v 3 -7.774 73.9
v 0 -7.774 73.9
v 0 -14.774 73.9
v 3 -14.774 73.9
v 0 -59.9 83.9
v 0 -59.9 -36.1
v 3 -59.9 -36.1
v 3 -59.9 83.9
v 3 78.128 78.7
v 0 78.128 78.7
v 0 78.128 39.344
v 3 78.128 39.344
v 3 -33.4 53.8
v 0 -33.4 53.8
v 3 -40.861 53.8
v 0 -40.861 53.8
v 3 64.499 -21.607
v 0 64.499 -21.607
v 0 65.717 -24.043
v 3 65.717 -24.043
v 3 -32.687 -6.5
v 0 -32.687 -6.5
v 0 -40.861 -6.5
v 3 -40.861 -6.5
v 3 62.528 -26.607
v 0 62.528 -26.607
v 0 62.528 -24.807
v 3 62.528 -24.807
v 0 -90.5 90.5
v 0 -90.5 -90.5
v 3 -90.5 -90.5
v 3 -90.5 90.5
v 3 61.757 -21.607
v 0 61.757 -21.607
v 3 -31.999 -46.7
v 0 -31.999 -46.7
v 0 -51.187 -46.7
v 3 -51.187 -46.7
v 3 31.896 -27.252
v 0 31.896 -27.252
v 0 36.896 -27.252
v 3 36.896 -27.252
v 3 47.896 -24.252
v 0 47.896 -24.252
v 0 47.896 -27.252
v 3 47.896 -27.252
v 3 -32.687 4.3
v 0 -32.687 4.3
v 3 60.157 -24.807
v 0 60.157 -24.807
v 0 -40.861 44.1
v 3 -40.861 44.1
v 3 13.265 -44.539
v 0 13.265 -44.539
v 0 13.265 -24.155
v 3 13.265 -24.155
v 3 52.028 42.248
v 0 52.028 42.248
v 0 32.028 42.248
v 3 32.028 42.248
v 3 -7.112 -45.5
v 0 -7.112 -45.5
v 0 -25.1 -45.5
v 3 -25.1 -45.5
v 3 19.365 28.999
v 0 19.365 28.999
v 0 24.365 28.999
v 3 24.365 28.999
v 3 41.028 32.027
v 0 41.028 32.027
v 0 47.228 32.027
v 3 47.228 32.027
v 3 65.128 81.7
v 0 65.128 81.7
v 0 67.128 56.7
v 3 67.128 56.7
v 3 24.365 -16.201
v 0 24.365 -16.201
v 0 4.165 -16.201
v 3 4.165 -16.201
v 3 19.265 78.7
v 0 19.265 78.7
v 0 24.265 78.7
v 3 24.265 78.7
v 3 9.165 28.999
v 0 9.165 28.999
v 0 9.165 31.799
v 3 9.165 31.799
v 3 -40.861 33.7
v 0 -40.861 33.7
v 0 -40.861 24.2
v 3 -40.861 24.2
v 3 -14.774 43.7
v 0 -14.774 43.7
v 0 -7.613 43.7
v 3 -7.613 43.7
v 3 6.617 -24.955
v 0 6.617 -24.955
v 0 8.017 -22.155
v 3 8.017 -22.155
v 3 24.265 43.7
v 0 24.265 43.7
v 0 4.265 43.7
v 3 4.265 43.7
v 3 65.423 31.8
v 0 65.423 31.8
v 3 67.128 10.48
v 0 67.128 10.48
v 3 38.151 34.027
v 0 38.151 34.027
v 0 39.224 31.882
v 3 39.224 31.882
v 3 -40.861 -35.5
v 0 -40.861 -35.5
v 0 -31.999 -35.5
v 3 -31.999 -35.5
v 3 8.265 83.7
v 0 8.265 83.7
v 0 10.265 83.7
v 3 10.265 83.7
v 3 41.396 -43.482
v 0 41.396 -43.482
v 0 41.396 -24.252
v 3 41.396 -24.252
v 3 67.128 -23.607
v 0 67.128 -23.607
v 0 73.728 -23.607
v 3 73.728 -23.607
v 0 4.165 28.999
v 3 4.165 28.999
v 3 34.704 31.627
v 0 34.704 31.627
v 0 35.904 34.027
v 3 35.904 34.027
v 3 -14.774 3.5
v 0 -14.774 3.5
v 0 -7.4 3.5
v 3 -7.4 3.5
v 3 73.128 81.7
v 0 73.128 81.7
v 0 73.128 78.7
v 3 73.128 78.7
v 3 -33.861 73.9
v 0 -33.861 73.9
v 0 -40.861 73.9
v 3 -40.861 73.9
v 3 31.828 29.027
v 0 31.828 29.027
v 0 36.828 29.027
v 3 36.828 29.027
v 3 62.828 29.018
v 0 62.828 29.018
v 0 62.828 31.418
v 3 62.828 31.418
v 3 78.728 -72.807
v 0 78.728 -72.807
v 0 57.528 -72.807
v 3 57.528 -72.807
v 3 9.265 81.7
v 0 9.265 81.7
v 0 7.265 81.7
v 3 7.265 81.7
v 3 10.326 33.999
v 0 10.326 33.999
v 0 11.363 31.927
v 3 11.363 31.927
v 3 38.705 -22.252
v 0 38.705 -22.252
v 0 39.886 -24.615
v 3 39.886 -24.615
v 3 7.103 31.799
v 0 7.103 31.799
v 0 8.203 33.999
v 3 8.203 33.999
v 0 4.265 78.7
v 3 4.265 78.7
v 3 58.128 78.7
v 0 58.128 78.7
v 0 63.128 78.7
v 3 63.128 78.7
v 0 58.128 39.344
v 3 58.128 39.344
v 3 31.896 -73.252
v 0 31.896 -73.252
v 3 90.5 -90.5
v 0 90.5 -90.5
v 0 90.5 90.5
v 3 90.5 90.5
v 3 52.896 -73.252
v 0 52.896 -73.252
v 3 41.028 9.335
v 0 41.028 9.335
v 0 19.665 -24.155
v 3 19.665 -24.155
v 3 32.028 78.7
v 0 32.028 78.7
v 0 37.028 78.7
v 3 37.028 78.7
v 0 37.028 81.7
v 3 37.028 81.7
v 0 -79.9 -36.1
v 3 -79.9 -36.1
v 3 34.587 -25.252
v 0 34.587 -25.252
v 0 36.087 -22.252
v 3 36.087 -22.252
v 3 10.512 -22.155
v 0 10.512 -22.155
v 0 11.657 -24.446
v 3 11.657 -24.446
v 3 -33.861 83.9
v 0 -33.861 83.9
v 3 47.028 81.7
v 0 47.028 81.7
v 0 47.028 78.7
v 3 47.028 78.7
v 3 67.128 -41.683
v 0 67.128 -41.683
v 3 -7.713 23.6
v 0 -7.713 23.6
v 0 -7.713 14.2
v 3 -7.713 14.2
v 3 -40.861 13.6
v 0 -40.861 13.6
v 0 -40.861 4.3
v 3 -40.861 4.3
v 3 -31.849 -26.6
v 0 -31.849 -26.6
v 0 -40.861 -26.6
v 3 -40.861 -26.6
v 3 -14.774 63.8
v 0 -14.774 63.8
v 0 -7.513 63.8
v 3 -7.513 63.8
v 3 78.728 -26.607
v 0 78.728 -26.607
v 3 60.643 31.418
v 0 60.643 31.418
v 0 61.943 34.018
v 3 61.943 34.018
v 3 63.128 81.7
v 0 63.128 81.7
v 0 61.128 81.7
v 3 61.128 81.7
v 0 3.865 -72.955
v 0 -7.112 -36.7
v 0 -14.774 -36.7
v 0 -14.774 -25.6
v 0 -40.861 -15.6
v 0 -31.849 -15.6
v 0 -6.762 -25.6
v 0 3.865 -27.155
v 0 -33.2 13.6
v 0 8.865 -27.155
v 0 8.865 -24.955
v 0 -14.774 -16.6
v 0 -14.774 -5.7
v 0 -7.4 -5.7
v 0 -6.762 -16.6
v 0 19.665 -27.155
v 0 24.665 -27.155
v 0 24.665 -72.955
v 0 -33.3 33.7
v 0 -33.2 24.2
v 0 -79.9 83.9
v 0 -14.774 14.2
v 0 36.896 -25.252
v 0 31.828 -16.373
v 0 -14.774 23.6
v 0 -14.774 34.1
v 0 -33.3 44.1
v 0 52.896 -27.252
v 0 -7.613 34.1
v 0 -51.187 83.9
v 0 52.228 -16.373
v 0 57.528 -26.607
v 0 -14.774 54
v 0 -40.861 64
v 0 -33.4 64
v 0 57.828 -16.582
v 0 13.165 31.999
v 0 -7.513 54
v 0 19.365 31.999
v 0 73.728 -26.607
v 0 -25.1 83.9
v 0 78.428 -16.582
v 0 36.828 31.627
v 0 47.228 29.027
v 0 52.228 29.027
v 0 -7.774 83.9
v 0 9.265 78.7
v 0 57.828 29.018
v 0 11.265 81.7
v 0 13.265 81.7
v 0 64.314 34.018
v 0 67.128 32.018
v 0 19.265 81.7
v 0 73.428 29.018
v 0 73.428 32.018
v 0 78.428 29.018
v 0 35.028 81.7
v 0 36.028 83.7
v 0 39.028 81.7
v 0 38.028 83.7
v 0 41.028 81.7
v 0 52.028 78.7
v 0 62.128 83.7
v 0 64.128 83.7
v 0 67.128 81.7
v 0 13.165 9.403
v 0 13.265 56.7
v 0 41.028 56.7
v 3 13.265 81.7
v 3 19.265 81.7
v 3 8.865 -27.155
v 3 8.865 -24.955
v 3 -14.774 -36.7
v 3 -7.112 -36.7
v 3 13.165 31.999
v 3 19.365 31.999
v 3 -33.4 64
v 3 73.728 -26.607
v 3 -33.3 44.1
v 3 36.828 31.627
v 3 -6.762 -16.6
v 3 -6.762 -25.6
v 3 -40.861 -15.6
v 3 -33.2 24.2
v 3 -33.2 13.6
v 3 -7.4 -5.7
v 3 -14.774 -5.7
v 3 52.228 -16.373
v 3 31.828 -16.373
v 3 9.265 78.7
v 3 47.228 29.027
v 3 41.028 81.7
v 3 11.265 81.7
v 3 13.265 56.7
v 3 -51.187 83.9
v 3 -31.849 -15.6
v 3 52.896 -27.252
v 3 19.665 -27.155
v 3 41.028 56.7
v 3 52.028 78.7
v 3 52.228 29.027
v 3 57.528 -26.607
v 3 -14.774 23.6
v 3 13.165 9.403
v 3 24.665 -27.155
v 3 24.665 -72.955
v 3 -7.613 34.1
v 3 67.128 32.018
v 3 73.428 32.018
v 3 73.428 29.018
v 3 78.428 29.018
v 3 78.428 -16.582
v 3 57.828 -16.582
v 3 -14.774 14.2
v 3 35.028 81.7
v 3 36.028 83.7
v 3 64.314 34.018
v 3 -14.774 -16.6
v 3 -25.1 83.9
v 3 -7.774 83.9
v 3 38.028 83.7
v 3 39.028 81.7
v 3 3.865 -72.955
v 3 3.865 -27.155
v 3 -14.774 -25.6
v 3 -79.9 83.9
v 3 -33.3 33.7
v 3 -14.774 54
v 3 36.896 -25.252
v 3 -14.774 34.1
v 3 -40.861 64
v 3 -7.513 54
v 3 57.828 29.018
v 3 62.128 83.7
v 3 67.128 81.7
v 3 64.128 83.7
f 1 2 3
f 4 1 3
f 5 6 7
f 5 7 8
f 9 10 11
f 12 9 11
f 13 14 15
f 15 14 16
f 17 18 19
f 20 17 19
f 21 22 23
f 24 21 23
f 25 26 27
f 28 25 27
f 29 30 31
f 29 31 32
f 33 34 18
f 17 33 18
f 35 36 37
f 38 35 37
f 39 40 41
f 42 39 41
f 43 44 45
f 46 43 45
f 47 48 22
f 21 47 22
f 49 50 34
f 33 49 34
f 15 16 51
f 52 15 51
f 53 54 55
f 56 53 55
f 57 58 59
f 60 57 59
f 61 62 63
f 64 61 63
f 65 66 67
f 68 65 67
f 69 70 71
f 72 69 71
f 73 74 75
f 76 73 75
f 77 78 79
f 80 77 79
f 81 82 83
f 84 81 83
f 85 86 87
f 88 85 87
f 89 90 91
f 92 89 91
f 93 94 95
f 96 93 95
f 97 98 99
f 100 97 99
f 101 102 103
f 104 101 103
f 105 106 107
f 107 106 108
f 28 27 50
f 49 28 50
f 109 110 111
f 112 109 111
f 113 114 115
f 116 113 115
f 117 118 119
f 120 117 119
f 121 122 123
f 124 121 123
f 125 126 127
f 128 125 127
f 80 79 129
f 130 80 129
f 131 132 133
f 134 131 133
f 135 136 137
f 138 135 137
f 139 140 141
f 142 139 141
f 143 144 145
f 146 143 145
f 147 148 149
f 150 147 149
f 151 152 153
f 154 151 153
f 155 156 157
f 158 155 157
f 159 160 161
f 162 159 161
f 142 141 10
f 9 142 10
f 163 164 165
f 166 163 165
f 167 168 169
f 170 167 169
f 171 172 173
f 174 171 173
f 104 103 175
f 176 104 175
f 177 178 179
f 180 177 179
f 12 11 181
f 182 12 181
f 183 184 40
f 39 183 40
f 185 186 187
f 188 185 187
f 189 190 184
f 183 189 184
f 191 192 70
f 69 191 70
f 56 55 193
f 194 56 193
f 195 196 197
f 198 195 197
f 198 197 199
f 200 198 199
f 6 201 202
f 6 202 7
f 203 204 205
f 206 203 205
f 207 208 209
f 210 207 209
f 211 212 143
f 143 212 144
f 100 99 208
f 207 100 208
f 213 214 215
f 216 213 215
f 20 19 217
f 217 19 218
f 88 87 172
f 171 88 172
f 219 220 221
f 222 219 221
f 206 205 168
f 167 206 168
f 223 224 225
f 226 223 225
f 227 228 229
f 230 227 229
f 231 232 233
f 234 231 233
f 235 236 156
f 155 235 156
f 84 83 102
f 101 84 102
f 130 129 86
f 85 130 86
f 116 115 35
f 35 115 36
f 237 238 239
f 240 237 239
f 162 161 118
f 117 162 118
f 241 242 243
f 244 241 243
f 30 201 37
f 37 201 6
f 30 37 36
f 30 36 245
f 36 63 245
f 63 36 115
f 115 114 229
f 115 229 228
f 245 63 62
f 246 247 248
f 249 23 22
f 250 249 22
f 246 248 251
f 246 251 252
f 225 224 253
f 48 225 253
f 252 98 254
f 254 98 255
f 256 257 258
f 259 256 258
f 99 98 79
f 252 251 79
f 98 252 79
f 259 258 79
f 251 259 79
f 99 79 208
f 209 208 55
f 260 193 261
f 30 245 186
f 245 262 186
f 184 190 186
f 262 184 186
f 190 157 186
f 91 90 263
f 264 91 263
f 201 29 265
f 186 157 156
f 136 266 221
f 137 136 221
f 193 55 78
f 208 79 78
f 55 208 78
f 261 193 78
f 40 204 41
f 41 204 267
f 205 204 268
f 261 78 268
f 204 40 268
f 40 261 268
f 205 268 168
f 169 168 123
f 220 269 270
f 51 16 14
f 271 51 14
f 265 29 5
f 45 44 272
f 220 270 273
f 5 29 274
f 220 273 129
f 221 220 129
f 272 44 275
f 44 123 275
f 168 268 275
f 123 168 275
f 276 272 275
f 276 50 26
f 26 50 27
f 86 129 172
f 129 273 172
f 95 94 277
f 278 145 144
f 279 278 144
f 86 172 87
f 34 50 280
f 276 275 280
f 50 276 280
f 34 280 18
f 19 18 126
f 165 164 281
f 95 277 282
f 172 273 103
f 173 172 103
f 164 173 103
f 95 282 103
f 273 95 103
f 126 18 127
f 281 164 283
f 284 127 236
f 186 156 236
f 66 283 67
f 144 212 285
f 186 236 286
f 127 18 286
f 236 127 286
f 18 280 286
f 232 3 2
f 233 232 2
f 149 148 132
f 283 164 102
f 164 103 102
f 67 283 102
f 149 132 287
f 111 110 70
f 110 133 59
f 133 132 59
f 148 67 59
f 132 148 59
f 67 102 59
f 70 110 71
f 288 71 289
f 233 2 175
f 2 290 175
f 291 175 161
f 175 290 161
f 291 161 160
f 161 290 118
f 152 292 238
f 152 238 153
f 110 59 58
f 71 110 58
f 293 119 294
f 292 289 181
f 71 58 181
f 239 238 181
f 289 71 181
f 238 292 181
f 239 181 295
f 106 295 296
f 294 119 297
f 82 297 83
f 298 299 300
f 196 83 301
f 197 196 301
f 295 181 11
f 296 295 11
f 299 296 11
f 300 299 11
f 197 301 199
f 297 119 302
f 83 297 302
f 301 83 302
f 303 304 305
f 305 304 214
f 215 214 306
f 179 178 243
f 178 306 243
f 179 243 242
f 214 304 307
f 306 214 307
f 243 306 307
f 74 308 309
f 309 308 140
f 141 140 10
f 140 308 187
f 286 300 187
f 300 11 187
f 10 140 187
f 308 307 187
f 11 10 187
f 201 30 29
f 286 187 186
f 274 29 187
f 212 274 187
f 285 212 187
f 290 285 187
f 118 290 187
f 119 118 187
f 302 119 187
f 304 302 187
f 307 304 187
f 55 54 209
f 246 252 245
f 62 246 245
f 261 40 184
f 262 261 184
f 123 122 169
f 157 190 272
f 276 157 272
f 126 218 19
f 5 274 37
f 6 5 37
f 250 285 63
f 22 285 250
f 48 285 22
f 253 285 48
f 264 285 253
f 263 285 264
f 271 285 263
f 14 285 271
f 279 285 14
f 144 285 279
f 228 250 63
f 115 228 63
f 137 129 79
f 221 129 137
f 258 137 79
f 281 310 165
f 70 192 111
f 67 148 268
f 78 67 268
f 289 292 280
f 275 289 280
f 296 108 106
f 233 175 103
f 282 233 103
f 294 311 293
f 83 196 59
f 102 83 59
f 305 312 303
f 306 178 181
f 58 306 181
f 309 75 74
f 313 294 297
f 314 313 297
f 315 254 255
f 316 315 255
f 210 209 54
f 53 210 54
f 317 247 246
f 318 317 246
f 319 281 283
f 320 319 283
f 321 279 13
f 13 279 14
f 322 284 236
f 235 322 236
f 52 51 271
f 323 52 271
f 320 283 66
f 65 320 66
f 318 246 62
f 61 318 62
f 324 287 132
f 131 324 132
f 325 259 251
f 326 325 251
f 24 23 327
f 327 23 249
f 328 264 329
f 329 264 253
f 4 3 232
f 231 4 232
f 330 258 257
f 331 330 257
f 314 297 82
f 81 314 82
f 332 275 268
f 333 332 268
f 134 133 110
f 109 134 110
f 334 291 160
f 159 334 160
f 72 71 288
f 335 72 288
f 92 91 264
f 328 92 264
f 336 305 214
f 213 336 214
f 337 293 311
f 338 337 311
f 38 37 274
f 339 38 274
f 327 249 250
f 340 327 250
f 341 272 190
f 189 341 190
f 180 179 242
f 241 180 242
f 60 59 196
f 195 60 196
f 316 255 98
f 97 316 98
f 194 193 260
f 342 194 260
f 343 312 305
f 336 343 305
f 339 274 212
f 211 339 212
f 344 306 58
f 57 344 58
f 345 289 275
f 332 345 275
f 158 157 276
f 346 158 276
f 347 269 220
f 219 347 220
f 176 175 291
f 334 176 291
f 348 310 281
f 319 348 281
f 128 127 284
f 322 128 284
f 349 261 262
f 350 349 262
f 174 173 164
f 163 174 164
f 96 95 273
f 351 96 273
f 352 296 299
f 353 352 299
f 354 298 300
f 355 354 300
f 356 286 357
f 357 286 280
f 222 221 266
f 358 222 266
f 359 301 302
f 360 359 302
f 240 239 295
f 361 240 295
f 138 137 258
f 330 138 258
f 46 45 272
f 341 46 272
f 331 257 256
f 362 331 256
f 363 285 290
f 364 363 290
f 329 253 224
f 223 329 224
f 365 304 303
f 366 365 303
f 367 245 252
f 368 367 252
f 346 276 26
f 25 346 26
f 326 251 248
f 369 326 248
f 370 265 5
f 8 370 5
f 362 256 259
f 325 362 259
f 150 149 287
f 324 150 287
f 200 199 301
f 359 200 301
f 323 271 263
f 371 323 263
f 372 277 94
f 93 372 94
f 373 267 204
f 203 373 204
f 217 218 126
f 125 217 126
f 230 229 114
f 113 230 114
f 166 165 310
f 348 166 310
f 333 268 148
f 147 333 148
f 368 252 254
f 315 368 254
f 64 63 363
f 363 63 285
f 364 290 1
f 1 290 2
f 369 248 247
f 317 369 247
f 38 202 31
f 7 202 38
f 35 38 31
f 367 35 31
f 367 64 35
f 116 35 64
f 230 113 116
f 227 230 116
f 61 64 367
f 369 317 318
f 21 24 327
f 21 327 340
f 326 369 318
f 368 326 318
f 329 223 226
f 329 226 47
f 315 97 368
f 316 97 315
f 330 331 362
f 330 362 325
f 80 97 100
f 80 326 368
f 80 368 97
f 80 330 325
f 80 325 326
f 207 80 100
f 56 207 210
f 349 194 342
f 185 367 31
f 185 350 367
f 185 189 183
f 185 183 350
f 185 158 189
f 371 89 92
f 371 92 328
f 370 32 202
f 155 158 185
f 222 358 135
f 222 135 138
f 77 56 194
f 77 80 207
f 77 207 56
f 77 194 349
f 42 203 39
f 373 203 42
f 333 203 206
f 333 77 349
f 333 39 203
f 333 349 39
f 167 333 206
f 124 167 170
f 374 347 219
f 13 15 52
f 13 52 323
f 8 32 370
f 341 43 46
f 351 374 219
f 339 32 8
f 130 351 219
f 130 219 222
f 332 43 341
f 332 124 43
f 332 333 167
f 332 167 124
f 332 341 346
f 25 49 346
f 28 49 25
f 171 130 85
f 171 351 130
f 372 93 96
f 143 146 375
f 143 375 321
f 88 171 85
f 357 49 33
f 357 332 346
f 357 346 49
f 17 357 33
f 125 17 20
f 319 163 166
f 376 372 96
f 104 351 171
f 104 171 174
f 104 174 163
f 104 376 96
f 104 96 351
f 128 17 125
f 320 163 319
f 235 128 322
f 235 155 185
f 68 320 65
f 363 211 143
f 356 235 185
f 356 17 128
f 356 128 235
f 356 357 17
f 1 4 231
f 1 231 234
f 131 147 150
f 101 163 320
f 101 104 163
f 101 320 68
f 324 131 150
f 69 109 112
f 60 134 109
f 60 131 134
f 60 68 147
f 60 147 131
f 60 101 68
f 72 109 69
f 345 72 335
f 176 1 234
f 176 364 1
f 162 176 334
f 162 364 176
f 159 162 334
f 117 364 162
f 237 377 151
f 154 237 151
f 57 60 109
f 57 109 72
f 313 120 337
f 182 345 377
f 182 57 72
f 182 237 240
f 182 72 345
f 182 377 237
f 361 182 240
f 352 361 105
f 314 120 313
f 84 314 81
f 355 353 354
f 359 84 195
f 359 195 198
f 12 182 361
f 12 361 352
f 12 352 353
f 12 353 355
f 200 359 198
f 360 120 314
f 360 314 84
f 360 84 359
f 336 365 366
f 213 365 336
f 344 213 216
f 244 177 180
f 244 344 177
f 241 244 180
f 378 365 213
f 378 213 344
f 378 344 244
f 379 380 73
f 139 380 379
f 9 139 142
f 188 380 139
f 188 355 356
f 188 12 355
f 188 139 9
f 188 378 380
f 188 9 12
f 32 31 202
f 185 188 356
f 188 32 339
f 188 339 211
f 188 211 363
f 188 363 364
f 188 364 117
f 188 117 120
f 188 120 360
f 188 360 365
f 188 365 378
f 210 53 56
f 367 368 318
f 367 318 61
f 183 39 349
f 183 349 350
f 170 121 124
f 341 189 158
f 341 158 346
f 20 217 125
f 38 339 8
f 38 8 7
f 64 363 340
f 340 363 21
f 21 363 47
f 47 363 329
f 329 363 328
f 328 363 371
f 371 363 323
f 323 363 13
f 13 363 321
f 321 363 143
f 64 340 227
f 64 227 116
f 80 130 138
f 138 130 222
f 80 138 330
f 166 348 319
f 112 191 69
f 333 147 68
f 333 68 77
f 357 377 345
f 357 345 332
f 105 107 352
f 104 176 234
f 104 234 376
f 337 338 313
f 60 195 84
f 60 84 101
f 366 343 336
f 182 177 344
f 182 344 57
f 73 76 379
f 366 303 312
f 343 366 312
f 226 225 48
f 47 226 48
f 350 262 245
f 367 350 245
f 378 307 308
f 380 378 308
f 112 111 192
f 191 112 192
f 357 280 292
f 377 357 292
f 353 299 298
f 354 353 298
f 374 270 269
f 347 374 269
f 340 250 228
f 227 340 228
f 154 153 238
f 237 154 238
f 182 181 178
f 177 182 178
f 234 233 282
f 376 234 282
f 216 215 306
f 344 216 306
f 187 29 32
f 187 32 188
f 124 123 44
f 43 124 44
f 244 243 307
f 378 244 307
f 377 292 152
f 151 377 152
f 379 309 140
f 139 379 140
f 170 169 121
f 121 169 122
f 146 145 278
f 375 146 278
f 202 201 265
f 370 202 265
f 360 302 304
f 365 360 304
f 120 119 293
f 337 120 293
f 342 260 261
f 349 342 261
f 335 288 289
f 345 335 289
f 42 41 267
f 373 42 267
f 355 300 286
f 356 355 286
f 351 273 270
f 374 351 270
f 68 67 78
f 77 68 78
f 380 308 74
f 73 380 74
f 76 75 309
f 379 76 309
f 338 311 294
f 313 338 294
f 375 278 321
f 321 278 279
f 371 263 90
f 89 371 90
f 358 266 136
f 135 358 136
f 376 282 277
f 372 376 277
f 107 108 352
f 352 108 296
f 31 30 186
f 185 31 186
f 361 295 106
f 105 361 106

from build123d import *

# Parameters (mm, degrees)
F0_W     = 181
F0_H     = 181
F0_W_2   = 20
F0_H_2   = 120
F1_DEPTH = 3


with BuildPart() as f1:
    # F0 (on Right) → F1 (new body)
    with BuildSketch(Plane.YZ):
        Rectangle(F0_W, F0_H)
        Polygon((8.017361, -22.155164), (10.511788, -22.155164), (11.657102, -24.445793), (13.264574, -44.539195), (13.264574, -24.155164), (19.664574, -24.155164), (19.664574, -27.155164), (24.664574, -27.155164), (24.664574, -72.955163), (3.864575, -72.955163), (3.864575, -27.155164), (8.864575, -27.155164), (8.864575, -24.955163), (6.617362, -24.955163), align=None, mode=Mode.SUBTRACT)
        Polygon((31.895746, -73.251659), (31.895746, -27.251661), (36.895746, -27.251661), (36.895746, -25.251659), (34.586729, -25.251659), (36.086728, -22.251661), (38.70476, -22.251661), (39.886403, -24.614947), (41.395744, -43.481709), (41.395744, -24.251661), (47.895743, -24.251661), (47.895743, -27.251661), (52.895743, -27.251661), (52.895743, -73.251659), align=None, mode=Mode.SUBTRACT)
        Polygon((73.728273, -23.606915), (73.728273, -26.606915), (78.728273, -26.606915), (78.728273, -72.806911), (57.528277, -72.806911), (57.528277, -26.606915), (62.528277, -26.606915), (62.528277, -24.806911), (60.157458, -24.806911), (61.757456, -21.606915), (64.499095, -21.606915), (65.717066, -24.042858), (67.128275, -41.682975), (67.128275, -23.606915), align=None, mode=Mode.SUBTRACT)
        with Locations((-69.899997, 23.899991)):
            Rectangle(F0_W_2, F0_H_2, mode=Mode.SUBTRACT)
        Polygon((-51.186814, -46.700009), (-51.186814, 83.899991), (-33.861232, 83.899991), (-33.861232, 73.899991), (-40.861232, 73.899991), (-40.861232, 63.999991), (-33.400224, 63.999991), (-33.400224, 53.799991), (-40.861232, 53.799991), (-40.861232, 44.099991), (-33.300224, 44.099991), (-33.300224, 33.699991), (-40.861232, 33.699991), (-40.861232, 24.199991), (-33.200224, 24.199991), (-33.200224, 13.599991), (-40.861232, 13.599991), (-40.861232, 4.299991), (-32.686683, 4.299991), (-32.686683, -6.500009), (-40.861232, -6.500009), (-40.861232, -15.600009), (-31.84899, -15.600009), (-31.84899, -26.600009), (-40.861232, -26.600009), (-40.861232, -35.500009), (-31.998828, -35.500009), (-31.998828, -46.700009), align=None, mode=Mode.SUBTRACT)
        Polygon((-7.774414, 73.899968), (-14.774414, 73.899968), (-14.774414, 63.799968), (-7.513406, 63.799968), (-7.513406, 53.999968), (-14.774414, 53.999968), (-14.774414, 43.699968), (-7.613406, 43.699968), (-7.613406, 34.099968), (-14.774414, 34.099968), (-14.774414, 23.599968), (-7.713406, 23.599968), (-7.713406, 14.199968), (-14.774414, 14.199968), (-14.774414, 3.499968), (-7.399865, 3.499968), (-7.399865, -5.700032), (-14.774414, -5.700032), (-14.774414, -16.600032), (-6.762172, -16.600032), (-6.762172, -25.600032), (-14.774414, -25.600032), (-14.774414, -36.700032), (-7.11201, -36.700032), (-7.11201, -45.500032), (-25.099996, -45.500032), (-25.099996, 83.899968), (-7.774414, 83.899968), align=None, mode=Mode.SUBTRACT)
        Polygon((19.364575, 31.999375), (19.364575, 28.999375), (24.364575, 28.999375), (24.364575, -16.200625), (4.164575, -16.200625), (4.164575, 28.999375), (9.164575, 28.999375), (9.164575, 31.799375), (7.102771, 31.799375), (8.202771, 33.999375), (10.326378, 33.999375), (11.362707, 31.926718), (13.164575, 9.403368), (13.164575, 31.999375), align=None, mode=Mode.SUBTRACT)
        Polygon((38.151176, 34.027429), (39.223833, 31.882114), (41.027569, 9.33542), (41.027569, 32.027429), (47.227569, 32.027429), (47.227569, 29.027429), (52.227569, 29.027429), (52.227569, -16.372571), (31.827568, -16.372571), (31.827568, 29.027429), (36.827568, 29.027429), (36.827568, 31.627429), (34.703961, 31.627429), (35.903962, 34.027429), align=None, mode=Mode.SUBTRACT)
        Polygon((73.428275, 32.017772), (73.428275, 29.017772), (78.428275, 29.017772), (78.428275, -16.582227), (57.828276, -16.582227), (57.828276, 29.017772), (62.828276, 29.017772), (62.828276, 31.417773), (60.642866, 31.417773), (61.942866, 34.017772), (64.313686, 34.017772), (65.422671, 31.799801), (67.128276, 10.479749), (67.128276, 32.017772), align=None, mode=Mode.SUBTRACT)
        Polygon((4.264574, 43.70002), (4.264574, 78.70002), (9.264574, 78.70002), (9.264574, 81.70002), (7.264574, 81.70002), (8.264574, 83.70002), (10.264574, 83.70002), (11.264574, 81.70002), (13.264574, 56.70002), (13.264574, 81.70002), (19.264574, 81.70002), (19.264574, 78.70002), (24.264574, 78.70002), (24.264574, 43.70002), align=None, mode=Mode.SUBTRACT)
        Polygon((32.027569, 42.248159), (32.027569, 78.70002), (37.027569, 78.70002), (37.027569, 81.70002), (35.027569, 81.70002), (36.027569, 83.70002), (38.027569, 83.70002), (39.027569, 81.70002), (41.027569, 56.70002), (41.027569, 81.70002), (47.027569, 81.70002), (47.027569, 78.70002), (52.027569, 78.70002), (52.027569, 42.248159), align=None, mode=Mode.SUBTRACT)
        Polygon((58.128275, 39.344446), (58.128275, 78.70002), (63.128275, 78.70002), (63.128275, 81.70002), (61.128275, 81.70002), (62.128275, 83.70002), (64.128275, 83.70002), (65.128275, 81.70002), (67.128275, 56.70002), (67.128275, 81.70002), (73.128275, 81.70002), (73.128275, 78.70002), (78.128275, 78.70002), (78.128275, 39.344446), align=None, mode=Mode.SUBTRACT)
    extrude(amount=F1_DEPTH)


solid = f1.part
